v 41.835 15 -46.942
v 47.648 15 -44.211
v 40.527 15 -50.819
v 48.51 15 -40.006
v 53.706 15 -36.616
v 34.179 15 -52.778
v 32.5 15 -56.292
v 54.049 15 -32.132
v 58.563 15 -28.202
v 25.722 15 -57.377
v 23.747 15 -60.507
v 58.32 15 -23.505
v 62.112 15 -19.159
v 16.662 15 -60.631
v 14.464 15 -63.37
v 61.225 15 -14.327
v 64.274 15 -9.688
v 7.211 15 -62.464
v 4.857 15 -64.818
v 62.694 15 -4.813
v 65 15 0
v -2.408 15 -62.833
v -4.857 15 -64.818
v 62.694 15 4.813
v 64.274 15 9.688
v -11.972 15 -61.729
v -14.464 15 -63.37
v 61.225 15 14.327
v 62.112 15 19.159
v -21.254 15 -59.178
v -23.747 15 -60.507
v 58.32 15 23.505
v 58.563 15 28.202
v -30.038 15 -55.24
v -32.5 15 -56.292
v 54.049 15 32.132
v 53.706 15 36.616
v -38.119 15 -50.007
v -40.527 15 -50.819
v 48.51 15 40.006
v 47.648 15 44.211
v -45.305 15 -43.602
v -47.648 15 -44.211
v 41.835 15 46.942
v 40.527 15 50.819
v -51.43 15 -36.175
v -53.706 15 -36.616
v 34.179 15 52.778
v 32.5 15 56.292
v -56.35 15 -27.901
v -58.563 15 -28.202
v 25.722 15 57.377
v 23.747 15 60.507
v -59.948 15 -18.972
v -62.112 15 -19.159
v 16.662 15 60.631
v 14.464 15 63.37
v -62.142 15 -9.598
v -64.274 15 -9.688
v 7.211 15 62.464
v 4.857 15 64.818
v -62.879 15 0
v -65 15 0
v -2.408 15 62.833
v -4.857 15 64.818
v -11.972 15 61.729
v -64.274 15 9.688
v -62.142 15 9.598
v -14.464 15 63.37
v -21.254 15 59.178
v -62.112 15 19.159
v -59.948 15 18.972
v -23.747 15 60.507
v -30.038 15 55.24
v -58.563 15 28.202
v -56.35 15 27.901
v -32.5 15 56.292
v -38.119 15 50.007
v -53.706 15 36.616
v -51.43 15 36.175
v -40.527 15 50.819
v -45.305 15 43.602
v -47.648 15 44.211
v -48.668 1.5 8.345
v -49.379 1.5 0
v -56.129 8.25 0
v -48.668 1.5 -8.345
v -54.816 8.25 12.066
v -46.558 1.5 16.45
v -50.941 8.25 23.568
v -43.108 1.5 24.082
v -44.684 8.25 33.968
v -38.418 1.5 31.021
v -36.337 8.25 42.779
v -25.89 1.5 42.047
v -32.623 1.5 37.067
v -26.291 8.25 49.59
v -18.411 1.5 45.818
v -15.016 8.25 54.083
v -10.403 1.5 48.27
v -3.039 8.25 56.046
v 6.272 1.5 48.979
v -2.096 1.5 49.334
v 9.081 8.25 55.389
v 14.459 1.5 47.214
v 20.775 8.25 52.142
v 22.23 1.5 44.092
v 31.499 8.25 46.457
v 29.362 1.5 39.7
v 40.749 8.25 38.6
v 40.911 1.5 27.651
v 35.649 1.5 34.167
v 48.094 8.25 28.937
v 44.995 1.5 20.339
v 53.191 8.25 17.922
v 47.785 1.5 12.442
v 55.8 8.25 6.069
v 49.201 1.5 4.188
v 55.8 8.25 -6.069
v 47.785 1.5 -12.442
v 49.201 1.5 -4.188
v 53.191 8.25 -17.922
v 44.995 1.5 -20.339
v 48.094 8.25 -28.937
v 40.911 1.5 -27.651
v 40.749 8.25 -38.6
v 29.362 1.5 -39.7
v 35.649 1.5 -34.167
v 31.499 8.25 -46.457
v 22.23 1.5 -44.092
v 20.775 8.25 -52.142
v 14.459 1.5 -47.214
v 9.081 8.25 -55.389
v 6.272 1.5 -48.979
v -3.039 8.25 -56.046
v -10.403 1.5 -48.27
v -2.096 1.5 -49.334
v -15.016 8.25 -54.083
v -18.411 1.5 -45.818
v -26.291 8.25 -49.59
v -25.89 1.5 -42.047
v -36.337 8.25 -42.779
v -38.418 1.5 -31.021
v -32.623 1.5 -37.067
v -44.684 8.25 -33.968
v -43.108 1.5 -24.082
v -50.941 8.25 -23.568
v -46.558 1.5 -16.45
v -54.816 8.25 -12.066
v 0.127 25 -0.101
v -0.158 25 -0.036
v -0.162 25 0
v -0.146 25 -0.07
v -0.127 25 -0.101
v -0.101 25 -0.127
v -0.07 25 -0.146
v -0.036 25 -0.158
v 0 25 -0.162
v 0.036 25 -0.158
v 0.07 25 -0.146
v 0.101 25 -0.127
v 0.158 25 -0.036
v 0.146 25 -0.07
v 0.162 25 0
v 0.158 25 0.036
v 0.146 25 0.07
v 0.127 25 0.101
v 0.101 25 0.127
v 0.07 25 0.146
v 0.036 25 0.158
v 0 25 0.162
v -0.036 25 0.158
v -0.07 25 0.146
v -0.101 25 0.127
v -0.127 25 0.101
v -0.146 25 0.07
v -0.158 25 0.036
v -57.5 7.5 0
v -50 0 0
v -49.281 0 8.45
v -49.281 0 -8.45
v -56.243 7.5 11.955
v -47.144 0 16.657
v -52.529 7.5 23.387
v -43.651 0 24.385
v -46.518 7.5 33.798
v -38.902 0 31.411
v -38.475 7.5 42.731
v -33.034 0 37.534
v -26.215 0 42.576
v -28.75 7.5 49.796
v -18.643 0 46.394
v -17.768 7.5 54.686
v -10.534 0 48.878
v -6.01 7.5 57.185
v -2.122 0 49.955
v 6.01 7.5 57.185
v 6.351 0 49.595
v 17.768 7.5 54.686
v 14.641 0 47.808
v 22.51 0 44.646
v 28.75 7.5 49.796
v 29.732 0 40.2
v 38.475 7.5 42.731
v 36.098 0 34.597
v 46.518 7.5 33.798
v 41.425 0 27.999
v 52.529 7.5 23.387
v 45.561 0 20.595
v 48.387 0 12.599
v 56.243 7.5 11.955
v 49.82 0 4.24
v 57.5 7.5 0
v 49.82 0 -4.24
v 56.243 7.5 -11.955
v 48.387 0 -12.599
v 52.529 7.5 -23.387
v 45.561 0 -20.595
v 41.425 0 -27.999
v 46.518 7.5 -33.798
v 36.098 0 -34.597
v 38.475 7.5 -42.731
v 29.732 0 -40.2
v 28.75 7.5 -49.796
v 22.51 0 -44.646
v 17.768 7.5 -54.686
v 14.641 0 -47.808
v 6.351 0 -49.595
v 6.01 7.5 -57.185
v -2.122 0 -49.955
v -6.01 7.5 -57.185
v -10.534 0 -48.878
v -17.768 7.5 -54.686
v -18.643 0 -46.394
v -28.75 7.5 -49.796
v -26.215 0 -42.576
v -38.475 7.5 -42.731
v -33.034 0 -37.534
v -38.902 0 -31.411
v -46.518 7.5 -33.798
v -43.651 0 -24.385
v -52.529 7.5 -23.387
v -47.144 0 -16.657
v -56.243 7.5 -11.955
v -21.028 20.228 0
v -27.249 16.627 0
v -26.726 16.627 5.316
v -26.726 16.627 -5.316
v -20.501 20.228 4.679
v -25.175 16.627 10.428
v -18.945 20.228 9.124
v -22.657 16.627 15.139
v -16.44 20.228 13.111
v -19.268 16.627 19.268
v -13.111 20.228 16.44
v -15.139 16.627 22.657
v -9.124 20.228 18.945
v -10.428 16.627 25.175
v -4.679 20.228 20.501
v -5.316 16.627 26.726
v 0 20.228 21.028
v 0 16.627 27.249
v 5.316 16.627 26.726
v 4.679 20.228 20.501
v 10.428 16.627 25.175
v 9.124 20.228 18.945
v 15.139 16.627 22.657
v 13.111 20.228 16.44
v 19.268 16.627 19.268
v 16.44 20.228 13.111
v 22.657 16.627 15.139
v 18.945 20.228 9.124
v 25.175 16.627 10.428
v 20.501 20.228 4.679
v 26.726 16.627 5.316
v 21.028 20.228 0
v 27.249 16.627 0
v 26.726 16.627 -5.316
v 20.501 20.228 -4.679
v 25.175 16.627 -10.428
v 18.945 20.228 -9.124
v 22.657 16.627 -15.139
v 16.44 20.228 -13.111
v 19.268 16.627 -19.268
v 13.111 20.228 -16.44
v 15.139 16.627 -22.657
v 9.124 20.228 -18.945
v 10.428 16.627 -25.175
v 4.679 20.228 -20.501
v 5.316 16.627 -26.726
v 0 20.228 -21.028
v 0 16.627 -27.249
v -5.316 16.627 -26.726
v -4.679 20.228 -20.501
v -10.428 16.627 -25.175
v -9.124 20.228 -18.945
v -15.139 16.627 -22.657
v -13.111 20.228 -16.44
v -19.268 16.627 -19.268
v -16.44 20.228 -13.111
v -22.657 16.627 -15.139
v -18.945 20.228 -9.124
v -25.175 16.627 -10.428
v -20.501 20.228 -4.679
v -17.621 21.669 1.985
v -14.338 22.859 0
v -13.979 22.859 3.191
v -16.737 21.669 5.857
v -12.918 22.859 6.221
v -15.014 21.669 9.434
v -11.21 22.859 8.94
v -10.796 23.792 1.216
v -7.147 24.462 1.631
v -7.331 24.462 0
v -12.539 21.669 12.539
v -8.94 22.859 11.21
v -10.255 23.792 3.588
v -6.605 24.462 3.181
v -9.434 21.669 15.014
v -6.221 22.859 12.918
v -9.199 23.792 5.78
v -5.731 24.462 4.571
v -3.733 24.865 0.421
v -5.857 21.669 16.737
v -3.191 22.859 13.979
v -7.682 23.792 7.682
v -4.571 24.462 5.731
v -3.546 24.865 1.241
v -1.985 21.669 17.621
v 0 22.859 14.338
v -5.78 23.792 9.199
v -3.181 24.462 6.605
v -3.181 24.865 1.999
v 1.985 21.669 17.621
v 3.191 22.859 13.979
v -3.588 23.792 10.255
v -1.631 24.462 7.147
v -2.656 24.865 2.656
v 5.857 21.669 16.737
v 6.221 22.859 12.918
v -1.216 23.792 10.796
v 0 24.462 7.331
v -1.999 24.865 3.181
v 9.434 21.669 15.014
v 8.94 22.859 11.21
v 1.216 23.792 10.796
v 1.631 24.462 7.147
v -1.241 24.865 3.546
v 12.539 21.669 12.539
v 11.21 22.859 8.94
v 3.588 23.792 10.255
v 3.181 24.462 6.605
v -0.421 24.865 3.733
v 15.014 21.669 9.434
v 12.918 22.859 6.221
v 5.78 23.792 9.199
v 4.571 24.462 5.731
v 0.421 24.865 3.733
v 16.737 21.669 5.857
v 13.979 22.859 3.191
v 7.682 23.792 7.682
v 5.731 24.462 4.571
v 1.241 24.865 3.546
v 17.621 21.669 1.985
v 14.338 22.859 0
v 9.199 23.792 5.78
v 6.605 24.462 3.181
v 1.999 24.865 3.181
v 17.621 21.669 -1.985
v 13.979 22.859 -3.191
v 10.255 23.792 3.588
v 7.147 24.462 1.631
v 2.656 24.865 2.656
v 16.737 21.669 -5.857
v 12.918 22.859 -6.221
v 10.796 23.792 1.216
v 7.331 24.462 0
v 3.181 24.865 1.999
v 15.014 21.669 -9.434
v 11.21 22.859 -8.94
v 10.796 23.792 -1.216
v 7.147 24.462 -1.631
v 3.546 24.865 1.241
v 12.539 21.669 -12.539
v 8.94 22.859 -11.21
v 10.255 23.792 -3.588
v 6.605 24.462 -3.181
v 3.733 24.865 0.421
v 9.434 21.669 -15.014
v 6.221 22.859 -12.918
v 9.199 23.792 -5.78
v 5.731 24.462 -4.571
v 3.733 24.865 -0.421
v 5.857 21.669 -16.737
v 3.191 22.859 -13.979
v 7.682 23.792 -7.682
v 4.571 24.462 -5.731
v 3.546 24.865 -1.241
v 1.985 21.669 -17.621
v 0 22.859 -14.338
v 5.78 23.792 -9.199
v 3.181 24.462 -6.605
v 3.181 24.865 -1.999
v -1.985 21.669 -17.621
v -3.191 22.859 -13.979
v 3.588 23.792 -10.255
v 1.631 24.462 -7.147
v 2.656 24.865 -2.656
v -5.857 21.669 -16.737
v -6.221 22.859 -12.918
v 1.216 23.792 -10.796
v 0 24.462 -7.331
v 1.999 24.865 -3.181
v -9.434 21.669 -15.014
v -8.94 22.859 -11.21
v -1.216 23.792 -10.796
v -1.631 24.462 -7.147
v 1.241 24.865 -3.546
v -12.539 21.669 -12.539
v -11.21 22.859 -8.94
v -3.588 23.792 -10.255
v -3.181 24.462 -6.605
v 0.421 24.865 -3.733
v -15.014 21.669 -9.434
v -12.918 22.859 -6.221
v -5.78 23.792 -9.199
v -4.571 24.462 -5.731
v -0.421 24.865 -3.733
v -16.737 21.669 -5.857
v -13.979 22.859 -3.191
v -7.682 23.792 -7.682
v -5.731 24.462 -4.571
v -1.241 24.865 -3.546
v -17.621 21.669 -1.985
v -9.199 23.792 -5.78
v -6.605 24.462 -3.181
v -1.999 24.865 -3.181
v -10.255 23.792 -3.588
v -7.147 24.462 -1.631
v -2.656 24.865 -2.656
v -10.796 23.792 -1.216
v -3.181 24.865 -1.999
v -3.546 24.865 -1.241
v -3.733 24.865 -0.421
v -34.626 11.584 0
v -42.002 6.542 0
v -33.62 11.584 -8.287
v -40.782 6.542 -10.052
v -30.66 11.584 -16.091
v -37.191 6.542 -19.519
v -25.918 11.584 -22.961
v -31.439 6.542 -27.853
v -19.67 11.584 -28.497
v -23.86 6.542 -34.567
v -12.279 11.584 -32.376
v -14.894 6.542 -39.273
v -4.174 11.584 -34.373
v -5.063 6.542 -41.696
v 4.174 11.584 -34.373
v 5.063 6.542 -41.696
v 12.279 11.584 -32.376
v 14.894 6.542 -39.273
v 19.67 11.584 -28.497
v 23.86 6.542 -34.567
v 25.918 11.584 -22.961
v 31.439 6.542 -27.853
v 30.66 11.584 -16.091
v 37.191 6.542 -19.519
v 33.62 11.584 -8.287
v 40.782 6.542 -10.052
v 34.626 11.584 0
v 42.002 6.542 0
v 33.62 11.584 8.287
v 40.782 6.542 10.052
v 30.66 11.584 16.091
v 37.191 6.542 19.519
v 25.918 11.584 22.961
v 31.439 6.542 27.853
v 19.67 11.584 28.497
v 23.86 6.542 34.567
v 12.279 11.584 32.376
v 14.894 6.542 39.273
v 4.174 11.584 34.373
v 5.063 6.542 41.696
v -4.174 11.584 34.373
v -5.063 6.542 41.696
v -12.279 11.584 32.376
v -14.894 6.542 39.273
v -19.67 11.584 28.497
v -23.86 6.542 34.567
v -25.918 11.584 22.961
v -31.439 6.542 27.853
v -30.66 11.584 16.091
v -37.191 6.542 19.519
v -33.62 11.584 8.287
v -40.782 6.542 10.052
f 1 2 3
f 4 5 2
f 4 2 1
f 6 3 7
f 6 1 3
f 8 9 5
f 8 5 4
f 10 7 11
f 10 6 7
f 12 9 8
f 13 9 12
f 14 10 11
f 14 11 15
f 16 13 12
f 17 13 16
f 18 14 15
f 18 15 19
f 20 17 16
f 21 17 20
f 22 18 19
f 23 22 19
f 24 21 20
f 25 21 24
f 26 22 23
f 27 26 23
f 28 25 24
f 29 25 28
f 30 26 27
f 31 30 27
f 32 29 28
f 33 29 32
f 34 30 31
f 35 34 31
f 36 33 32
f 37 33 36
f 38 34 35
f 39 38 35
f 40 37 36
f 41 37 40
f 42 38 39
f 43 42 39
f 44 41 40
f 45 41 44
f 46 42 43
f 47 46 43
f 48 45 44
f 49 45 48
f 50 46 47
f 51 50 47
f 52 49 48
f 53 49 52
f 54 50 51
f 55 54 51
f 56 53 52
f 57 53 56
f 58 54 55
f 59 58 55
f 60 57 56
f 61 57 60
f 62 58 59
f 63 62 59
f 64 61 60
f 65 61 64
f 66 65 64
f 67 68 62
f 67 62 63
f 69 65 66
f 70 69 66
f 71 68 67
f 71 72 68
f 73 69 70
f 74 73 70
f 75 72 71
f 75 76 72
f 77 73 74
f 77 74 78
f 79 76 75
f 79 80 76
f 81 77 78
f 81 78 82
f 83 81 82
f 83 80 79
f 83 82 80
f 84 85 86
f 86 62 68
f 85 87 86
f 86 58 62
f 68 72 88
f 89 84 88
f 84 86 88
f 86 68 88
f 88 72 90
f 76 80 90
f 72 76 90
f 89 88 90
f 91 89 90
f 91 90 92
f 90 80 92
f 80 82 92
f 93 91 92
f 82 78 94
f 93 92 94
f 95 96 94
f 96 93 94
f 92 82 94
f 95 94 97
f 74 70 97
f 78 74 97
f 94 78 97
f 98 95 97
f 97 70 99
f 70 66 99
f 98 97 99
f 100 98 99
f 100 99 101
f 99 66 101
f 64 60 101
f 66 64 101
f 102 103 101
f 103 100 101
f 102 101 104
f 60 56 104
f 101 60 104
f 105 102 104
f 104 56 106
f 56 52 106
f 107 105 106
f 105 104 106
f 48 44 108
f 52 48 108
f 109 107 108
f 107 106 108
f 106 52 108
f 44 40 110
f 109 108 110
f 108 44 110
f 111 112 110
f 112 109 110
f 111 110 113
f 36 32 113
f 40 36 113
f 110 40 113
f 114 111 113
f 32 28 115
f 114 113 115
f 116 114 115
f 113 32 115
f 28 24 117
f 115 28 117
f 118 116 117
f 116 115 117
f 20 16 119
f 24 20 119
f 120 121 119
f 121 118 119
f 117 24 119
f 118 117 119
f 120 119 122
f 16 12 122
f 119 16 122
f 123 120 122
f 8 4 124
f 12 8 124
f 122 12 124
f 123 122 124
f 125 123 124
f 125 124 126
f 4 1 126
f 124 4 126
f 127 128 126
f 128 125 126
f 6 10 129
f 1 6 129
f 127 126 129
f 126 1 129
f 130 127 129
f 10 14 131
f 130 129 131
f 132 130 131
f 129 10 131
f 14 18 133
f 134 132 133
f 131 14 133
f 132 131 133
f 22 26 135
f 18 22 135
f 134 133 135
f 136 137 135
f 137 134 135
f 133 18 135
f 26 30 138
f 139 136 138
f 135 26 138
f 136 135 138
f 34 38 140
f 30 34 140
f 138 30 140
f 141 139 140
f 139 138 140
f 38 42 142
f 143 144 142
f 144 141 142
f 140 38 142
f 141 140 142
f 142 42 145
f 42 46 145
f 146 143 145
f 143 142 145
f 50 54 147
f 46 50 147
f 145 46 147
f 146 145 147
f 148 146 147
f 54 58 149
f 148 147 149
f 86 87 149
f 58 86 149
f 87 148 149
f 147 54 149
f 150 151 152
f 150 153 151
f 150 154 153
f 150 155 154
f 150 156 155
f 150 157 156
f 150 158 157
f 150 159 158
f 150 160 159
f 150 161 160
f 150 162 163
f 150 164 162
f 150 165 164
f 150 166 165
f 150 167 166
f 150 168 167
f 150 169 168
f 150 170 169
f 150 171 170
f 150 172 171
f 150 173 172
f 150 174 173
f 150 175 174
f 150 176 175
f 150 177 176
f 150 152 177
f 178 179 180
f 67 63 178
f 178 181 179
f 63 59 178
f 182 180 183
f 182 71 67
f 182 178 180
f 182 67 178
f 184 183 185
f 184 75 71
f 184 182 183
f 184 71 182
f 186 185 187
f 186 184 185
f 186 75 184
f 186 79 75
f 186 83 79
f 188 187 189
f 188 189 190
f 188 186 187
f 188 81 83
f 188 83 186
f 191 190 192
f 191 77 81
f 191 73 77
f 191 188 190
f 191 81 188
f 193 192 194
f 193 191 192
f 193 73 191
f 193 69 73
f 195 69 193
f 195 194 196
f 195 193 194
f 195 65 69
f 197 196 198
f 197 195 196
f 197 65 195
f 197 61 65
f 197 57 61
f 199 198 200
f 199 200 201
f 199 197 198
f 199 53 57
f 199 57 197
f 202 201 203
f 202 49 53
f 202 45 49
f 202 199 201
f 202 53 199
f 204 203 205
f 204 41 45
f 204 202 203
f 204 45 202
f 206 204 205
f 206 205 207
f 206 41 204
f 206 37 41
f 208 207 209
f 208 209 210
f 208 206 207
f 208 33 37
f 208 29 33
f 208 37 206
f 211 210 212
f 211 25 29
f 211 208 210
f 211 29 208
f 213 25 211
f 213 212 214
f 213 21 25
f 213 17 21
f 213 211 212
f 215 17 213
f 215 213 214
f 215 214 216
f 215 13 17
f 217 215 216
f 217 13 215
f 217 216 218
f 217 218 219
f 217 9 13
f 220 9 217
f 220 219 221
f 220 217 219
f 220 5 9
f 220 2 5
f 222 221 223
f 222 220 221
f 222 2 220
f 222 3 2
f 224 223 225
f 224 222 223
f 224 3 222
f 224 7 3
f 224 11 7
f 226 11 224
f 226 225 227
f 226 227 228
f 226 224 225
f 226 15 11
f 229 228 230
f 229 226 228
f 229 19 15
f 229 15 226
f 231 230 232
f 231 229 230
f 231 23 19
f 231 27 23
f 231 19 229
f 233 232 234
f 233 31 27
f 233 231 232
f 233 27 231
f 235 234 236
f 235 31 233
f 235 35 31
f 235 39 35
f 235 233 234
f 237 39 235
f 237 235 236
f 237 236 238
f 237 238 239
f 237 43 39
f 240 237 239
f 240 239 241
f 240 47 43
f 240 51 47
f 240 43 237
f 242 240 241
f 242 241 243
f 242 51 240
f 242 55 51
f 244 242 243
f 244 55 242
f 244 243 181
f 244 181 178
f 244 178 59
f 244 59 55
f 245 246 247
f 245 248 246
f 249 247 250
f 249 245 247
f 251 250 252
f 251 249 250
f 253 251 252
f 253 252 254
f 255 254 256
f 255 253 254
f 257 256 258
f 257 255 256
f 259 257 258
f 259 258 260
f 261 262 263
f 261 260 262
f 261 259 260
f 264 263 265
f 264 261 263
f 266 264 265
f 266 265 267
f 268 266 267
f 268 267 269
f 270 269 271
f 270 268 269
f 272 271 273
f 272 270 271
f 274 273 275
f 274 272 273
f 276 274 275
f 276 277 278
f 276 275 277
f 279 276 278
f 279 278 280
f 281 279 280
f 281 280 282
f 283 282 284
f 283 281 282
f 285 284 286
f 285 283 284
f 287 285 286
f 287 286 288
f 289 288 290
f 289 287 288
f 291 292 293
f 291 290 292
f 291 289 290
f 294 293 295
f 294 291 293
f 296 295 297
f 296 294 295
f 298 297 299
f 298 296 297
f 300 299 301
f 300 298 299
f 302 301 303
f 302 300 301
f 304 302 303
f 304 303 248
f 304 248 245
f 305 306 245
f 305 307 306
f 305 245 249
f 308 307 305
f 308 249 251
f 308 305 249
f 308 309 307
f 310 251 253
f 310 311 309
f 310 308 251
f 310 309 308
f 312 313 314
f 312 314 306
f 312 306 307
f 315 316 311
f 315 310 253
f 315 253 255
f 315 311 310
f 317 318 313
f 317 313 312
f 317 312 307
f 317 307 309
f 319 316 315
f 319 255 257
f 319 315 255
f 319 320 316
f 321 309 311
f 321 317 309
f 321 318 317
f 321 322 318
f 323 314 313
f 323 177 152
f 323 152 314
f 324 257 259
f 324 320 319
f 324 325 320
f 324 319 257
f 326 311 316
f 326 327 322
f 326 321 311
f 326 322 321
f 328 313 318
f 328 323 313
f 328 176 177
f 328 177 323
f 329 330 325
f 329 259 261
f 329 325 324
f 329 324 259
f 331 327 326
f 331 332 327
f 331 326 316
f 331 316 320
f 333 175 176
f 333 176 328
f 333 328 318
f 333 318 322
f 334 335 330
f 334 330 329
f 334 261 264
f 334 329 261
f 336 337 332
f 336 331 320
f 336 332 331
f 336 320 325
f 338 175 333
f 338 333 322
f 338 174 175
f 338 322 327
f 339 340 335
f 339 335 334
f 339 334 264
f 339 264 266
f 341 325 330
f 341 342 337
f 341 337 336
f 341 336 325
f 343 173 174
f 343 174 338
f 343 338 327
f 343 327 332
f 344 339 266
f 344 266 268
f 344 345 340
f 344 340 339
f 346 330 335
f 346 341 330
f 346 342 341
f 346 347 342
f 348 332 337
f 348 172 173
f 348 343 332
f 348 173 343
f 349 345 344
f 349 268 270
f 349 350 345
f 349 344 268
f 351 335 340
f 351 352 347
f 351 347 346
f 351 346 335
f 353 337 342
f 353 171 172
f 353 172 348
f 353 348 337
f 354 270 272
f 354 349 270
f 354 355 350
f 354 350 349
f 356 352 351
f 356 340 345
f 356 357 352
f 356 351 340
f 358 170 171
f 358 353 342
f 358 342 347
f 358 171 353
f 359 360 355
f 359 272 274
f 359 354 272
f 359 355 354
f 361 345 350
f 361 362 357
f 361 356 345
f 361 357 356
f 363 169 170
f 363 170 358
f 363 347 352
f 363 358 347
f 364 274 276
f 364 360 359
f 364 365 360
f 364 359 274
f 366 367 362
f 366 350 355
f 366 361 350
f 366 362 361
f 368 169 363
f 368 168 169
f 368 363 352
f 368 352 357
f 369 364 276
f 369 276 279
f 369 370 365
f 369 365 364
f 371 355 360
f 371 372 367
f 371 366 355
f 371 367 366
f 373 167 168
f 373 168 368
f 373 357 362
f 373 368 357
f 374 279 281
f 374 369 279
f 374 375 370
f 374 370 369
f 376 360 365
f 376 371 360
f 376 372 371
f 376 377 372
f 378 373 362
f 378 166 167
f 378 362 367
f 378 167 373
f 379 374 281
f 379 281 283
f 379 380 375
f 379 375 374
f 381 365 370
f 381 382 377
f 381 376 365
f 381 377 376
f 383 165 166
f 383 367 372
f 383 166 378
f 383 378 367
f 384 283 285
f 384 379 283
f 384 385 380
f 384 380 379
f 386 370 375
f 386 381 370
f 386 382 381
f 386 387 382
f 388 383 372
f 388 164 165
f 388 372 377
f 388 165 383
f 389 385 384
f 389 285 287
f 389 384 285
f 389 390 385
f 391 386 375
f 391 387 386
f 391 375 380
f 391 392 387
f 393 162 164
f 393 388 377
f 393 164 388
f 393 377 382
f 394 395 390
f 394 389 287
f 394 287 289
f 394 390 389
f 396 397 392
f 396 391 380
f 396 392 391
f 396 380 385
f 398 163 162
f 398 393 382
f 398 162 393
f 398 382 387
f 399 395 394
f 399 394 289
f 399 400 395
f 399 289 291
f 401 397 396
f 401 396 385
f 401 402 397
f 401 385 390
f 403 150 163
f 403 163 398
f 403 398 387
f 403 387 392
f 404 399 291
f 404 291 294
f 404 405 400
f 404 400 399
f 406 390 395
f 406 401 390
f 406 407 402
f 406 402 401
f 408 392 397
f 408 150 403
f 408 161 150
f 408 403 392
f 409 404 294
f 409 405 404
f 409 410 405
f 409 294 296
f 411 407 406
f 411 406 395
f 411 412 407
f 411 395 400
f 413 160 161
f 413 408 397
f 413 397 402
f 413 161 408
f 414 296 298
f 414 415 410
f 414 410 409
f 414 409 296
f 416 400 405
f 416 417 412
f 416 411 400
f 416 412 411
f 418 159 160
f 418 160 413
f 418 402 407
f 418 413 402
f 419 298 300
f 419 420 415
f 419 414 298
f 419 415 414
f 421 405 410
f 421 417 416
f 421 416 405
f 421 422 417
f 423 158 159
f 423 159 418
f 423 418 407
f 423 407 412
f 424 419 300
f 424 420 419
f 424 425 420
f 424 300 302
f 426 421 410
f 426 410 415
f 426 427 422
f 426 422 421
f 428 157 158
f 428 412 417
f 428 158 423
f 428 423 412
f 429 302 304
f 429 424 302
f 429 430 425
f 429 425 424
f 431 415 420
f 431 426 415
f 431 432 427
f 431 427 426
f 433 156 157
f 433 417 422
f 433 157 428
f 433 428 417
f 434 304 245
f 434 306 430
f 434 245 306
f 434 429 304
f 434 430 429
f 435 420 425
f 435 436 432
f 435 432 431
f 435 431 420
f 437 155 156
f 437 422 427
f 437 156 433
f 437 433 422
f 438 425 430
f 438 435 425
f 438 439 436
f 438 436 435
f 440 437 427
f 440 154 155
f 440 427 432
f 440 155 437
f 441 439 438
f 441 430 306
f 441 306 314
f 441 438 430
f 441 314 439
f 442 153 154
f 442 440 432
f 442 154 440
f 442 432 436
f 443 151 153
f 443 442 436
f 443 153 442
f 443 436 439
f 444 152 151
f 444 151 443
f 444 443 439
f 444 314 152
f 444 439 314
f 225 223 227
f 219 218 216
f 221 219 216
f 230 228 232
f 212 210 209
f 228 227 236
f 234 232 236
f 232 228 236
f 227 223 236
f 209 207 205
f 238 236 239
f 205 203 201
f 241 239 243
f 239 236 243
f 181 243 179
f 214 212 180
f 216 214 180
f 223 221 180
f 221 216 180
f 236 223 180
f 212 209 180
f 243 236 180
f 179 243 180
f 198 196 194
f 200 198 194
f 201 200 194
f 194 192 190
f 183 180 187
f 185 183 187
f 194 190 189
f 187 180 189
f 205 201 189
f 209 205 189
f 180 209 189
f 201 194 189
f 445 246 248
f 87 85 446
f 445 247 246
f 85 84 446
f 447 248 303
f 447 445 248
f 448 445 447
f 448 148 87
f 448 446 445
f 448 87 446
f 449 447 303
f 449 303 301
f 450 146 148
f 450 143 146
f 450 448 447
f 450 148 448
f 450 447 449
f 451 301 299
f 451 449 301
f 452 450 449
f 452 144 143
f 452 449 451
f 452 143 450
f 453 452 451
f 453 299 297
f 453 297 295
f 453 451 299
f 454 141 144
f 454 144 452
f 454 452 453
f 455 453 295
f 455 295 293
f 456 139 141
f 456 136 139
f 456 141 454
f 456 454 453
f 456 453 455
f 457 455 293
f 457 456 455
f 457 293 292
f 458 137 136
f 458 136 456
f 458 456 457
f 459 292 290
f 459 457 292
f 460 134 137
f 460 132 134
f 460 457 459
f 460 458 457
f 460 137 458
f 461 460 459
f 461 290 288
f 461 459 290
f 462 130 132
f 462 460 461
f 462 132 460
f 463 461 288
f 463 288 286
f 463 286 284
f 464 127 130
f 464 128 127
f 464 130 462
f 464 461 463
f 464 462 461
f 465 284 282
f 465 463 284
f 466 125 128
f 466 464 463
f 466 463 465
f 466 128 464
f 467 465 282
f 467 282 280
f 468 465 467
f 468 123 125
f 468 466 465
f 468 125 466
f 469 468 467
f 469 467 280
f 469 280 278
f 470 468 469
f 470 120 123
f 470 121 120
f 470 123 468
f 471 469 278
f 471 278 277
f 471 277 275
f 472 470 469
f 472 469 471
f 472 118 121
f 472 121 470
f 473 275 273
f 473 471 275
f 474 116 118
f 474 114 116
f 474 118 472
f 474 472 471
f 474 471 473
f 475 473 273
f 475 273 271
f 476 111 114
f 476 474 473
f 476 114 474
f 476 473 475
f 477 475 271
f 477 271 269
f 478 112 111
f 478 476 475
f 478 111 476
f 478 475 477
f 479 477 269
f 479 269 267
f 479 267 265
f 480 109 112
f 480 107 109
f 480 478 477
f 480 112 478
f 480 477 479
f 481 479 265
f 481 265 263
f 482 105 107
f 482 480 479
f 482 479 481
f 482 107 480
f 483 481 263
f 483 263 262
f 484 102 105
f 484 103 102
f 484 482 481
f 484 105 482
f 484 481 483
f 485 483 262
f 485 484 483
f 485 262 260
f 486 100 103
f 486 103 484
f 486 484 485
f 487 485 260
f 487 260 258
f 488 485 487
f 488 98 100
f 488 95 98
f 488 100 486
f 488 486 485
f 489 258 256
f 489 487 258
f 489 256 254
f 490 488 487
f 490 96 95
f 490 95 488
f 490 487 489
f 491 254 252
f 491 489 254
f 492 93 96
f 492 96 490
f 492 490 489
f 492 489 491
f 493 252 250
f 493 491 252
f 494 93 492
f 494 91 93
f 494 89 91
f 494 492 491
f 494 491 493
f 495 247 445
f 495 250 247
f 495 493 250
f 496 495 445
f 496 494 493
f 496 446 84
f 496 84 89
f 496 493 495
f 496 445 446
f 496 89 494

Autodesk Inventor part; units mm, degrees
ref_plane "YZ Plane" through (0, 0, 0) normal (1, 0, 0) x (0, 1, 0)
sketch "Sketch1" plane through (0, 0, 0) normal (0, 1, 0) x (-1, 0, 0)
  circle A0 centre (0, 0) radius 50
  dimension "d0" = 100
ref_plane "Work Plane1" through (0, 15, 0) normal (0, 1, 0) x (-1, 0, 0)
sketch "Sketch2" plane through (0, 15, 0) normal (0, 1, 0) x (-1, 0, 0)
  circle A0 centre (0, 0) radius 65
  dimension "d2" = 130
loft "Loft1" add profiles "Sketch2", "Sketch1"
shell "Shell1" thickness 1.5 removed faces 1 at (7.4104, 15, 20.36)
ref_plane "Work Plane2" through (0, 25, 0) normal (0, 1, 0) x (1, 0, 0)
sketch "Sketch3" plane through (0, 25, 0) normal (0, 1, 0) x (1, 0, 0)
  circle A0 centre (0, 0) radius 15
  dimension "d9" = 30
loft "Loft2" add profiles "Sketch3" section 1 edges at (49.3787, 1.5, 0)
fillet "Fillet1" radius 48 1 edges at (15, 25, 0)
properties part number "Wadah"
